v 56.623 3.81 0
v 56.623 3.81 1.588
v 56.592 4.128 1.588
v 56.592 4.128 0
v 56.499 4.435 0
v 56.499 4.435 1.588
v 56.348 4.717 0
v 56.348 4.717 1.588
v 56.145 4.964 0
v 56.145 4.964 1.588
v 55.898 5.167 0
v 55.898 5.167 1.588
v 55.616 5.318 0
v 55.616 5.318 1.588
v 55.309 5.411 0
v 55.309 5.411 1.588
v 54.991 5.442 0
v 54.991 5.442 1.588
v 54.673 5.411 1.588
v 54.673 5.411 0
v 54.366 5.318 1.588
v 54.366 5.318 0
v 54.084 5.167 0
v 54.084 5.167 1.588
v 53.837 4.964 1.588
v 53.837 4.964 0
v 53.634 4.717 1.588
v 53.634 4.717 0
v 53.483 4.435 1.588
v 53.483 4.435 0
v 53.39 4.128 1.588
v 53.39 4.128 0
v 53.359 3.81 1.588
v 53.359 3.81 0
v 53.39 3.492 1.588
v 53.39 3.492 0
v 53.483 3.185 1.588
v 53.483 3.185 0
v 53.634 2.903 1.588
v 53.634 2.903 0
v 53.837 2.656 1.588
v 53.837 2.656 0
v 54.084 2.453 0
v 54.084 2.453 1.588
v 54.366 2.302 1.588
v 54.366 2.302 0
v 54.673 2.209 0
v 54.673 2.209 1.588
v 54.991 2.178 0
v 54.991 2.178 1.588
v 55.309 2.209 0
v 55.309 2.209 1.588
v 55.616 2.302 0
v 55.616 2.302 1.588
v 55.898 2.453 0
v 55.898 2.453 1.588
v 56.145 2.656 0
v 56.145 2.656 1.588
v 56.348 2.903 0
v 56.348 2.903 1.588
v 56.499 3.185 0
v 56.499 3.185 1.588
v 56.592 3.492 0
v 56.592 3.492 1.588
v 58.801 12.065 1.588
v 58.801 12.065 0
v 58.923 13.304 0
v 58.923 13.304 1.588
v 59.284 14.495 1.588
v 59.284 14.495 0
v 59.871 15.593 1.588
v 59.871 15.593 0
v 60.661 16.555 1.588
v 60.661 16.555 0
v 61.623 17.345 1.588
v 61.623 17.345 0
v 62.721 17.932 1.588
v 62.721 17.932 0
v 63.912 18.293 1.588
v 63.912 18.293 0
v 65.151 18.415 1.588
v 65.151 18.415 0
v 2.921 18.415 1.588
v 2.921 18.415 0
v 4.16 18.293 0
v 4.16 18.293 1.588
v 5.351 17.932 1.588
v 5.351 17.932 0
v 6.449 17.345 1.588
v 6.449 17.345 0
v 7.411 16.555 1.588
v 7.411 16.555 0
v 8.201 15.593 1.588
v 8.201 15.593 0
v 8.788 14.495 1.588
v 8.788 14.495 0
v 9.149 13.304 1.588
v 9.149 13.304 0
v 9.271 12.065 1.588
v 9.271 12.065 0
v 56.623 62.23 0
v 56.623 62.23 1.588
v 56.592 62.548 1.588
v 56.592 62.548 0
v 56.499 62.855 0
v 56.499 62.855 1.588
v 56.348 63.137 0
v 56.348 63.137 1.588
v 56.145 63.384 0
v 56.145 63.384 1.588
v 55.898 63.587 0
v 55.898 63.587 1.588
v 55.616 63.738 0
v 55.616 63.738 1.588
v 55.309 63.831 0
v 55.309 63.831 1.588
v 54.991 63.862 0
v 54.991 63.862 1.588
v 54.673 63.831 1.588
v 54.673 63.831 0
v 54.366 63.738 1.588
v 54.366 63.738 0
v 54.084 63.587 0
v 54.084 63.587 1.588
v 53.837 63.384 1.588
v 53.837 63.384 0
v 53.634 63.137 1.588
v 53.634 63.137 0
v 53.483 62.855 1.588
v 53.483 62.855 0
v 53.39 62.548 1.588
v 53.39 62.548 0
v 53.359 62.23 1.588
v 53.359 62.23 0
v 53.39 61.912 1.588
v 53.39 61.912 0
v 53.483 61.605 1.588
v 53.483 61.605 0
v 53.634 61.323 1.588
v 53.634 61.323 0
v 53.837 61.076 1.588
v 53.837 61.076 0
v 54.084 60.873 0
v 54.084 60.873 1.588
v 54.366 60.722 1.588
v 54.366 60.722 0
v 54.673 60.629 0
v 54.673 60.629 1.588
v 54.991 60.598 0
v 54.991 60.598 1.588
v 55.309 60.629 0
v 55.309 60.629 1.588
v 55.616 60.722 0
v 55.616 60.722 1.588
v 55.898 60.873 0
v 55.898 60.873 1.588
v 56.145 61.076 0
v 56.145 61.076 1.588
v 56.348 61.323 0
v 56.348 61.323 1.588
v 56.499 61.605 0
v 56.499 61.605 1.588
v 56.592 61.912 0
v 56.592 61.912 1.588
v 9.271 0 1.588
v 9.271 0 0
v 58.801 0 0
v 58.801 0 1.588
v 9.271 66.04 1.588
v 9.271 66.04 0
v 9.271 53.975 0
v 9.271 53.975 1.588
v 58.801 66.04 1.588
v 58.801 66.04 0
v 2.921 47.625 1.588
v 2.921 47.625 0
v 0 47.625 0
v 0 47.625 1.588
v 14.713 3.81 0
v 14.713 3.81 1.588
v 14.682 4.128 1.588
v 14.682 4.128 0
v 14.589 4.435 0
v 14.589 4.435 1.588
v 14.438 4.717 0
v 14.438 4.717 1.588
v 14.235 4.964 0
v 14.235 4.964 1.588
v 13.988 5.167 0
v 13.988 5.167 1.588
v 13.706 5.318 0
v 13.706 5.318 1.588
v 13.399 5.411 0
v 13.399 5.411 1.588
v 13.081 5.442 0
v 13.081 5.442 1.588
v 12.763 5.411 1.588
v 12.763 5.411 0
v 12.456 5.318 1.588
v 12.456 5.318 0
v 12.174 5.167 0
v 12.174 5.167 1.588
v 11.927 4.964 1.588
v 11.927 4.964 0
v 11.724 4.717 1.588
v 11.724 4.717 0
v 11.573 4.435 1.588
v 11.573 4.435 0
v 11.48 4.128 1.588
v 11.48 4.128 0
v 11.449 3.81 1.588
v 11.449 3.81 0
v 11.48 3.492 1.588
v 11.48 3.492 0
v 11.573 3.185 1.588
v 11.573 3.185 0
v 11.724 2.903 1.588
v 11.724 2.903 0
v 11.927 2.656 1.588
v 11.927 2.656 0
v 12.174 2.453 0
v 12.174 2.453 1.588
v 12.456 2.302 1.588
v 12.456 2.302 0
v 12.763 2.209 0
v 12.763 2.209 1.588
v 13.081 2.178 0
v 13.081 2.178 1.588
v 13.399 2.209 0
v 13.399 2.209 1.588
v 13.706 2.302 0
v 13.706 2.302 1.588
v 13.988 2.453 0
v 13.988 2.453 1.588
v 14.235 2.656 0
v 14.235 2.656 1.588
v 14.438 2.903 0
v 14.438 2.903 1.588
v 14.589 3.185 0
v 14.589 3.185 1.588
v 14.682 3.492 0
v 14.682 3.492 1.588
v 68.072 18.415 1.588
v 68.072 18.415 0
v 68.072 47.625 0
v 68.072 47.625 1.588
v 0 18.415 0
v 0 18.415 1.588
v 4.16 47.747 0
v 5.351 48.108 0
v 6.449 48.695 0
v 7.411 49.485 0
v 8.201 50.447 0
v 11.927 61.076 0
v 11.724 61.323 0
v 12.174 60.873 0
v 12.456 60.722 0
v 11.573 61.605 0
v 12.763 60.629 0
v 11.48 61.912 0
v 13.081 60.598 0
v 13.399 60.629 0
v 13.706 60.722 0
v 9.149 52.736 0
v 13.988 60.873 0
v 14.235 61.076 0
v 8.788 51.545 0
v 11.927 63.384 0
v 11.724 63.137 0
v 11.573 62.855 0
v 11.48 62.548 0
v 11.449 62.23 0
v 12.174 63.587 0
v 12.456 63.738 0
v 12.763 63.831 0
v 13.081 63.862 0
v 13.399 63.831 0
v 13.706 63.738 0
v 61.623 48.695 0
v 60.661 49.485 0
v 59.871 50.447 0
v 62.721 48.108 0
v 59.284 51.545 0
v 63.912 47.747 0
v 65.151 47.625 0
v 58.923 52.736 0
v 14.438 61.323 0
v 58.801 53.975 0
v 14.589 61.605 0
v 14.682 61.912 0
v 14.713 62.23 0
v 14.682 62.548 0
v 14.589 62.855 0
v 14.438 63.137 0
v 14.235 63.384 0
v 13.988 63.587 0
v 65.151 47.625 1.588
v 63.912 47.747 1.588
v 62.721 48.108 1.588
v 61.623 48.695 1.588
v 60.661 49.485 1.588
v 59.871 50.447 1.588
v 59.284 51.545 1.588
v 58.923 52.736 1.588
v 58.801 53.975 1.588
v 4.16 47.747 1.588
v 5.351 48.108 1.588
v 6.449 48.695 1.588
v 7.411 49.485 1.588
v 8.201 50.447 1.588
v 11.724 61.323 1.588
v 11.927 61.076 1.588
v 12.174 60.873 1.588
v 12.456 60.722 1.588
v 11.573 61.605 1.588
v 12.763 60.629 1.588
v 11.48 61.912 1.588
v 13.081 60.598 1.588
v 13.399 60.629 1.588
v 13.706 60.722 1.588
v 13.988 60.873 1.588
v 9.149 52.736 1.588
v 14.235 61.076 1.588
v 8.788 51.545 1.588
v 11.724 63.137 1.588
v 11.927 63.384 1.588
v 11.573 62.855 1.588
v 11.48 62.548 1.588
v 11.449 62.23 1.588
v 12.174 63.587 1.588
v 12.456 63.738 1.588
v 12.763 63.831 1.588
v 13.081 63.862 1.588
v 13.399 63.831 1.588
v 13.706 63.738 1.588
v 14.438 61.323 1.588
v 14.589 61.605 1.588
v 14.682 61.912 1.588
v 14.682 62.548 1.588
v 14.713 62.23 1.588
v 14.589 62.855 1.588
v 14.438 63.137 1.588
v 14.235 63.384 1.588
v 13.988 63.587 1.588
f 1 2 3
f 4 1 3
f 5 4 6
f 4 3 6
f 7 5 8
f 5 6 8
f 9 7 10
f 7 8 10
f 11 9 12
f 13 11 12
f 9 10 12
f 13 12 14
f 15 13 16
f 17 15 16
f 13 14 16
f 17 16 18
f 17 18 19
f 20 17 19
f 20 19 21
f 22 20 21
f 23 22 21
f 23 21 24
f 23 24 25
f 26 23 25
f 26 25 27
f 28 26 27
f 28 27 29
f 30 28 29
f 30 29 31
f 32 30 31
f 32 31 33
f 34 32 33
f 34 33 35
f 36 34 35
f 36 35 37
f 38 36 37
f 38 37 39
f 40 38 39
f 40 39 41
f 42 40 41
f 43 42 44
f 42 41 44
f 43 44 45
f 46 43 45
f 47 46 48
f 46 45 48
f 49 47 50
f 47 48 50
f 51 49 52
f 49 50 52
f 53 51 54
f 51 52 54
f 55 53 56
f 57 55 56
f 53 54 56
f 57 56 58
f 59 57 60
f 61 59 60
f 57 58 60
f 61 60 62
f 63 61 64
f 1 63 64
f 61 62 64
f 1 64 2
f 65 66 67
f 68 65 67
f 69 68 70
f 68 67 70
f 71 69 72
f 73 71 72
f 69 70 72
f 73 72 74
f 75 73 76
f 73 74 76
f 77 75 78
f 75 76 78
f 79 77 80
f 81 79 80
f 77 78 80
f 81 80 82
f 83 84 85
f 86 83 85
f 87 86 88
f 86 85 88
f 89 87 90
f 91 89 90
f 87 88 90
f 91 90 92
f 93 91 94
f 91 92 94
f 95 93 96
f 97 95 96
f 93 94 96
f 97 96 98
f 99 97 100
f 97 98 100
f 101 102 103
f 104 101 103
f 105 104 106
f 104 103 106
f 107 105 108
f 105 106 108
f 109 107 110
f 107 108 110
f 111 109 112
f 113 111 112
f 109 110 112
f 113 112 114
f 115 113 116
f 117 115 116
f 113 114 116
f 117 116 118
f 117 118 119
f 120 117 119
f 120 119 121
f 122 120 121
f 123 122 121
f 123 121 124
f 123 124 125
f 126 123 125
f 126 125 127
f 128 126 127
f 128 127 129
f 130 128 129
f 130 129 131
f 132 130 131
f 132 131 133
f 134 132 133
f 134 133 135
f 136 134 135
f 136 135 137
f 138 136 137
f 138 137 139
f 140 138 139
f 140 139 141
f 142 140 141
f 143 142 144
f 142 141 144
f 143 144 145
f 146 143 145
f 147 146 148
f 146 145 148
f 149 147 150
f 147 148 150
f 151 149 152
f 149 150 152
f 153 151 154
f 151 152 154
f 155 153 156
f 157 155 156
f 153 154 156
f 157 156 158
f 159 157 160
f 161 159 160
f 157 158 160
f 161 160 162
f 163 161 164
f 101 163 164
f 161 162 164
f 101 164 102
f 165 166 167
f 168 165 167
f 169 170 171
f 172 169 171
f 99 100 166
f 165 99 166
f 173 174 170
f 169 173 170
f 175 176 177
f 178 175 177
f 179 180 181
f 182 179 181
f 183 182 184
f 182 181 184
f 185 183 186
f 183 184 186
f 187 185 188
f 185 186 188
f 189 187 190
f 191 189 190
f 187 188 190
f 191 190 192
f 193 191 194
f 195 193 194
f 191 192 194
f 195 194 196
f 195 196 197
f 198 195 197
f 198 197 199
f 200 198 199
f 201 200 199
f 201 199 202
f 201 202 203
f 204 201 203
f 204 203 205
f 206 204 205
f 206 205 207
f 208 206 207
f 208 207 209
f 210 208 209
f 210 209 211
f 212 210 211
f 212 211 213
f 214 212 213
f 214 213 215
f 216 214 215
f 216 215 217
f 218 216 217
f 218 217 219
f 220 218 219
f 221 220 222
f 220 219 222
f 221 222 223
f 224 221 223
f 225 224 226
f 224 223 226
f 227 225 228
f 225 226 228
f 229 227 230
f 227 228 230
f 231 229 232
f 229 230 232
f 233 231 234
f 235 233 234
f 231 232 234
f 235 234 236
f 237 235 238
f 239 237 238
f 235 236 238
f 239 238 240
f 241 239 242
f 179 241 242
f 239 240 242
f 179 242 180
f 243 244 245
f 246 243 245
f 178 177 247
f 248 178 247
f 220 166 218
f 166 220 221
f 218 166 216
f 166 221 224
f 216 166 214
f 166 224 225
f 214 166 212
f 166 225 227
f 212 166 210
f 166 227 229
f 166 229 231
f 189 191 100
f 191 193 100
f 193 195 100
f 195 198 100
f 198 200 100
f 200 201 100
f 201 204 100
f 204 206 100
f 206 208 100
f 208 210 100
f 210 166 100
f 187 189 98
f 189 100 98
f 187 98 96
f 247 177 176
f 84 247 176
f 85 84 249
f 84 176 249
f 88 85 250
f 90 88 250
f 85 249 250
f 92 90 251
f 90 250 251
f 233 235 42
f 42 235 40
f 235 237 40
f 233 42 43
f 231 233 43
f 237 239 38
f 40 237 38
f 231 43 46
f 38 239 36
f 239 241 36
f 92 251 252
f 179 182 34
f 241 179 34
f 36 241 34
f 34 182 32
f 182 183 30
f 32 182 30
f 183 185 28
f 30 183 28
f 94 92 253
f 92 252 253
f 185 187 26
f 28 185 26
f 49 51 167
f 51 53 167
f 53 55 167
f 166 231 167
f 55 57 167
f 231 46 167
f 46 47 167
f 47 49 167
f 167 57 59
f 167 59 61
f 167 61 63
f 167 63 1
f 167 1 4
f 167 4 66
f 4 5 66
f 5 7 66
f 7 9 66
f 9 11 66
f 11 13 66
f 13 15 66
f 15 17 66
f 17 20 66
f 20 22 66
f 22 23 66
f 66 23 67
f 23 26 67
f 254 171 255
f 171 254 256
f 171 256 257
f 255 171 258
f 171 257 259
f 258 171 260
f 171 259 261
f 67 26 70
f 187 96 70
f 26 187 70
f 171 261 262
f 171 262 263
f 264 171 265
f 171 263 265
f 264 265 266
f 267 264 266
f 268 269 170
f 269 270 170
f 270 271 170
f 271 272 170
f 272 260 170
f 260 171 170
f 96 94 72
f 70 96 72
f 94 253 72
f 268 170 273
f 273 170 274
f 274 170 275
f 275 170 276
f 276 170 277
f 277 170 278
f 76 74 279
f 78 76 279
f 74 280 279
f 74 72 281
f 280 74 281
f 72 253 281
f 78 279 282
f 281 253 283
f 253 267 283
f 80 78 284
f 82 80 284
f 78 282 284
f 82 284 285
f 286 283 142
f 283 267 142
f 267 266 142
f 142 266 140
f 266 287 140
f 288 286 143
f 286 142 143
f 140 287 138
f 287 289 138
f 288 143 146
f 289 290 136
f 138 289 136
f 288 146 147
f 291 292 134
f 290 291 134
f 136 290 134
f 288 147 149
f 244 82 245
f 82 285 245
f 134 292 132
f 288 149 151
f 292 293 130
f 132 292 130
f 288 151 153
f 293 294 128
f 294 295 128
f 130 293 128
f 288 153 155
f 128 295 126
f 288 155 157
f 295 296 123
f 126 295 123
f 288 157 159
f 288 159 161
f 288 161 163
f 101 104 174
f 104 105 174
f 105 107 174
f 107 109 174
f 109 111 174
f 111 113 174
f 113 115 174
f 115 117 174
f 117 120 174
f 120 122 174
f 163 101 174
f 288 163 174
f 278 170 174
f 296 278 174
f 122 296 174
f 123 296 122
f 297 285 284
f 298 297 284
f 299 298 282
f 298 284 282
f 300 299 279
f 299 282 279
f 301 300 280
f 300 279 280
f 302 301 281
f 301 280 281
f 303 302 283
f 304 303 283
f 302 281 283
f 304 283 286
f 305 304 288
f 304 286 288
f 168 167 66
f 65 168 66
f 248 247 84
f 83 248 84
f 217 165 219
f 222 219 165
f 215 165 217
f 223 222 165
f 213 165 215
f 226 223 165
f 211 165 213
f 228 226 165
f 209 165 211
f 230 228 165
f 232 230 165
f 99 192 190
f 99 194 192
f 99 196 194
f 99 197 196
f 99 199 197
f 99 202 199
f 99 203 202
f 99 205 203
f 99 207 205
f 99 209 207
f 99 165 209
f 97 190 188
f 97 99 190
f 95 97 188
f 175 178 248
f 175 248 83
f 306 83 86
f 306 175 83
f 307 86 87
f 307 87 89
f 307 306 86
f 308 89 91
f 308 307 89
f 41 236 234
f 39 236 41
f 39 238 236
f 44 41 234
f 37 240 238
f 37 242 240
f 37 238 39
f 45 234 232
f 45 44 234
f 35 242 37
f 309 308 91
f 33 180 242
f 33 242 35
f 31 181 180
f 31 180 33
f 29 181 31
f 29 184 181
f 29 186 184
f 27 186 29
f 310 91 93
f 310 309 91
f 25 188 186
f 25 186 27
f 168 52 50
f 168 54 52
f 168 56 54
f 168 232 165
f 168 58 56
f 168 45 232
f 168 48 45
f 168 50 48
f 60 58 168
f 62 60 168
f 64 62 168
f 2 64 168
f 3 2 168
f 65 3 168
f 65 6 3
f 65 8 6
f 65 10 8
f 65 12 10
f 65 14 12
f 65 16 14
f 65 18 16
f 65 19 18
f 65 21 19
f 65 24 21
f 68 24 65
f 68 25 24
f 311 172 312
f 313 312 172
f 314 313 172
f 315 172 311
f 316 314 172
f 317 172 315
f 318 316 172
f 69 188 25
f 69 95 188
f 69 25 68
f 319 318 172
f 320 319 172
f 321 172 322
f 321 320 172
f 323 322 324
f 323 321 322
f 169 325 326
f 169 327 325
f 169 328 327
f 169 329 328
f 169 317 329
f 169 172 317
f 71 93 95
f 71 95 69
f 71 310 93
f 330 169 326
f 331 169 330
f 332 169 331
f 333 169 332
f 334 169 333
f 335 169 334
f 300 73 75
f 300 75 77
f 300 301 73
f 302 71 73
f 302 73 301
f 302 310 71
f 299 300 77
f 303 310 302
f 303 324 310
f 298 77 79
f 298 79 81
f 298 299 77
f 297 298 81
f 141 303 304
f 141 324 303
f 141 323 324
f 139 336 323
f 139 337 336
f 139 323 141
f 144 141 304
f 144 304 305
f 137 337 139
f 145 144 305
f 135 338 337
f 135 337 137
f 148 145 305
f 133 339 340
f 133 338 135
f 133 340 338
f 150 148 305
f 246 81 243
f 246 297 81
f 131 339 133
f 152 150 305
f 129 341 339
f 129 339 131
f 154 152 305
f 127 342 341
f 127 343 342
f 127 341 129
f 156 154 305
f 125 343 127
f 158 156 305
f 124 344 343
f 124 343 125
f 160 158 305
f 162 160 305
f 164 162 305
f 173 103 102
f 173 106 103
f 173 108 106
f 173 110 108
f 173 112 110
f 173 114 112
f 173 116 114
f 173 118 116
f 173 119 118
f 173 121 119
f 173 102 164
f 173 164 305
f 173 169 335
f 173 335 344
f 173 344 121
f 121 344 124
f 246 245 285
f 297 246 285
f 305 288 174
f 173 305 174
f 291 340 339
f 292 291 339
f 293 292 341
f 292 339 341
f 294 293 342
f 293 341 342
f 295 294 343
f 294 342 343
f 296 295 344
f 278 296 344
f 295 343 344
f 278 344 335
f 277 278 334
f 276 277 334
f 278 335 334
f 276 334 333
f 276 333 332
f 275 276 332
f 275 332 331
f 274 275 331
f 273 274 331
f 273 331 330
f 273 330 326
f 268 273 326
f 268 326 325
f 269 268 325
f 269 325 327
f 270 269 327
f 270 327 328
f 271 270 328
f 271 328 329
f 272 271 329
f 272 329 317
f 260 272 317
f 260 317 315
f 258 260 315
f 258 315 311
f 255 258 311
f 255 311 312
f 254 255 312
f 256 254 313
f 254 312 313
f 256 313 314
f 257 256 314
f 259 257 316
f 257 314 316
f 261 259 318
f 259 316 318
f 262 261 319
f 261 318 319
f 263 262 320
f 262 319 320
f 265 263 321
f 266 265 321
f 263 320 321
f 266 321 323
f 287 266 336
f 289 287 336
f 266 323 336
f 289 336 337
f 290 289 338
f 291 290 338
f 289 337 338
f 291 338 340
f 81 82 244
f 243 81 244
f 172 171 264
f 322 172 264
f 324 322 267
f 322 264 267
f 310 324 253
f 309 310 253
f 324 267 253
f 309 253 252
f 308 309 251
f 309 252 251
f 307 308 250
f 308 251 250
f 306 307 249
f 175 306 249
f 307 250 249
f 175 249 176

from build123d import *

# Parameters (mm, degrees)
BOSS_EXTRUDE1_DEPTH = 1.5875
SKETCH3_R           = 1.63195
CUT_EXTRUDE1_DEPTH  = 95.855674265


with BuildPart() as part:
    # Sketch1 → Boss-Extrude1 (new body)
    with BuildSketch(Plane.XY):
        with BuildLine():
            Line((0, 47.625), (0, 18.415))
            Line((0, 18.415), (2.921, 18.415))
            ThreePointArc((2.921, 18.415), (7.411128061, 16.555128061), (9.271, 12.065))
            Line((9.271, 12.065), (9.271, 0))
            Line((9.271, 0), (58.801, 0))
            Line((58.801, 0), (58.801, 12.065))
            ThreePointArc((58.801, 12.065), (60.660871939, 16.555128061), (65.151, 18.415))
            Line((65.151, 18.415), (68.072, 18.415))
            Line((68.072, 18.415), (68.072, 47.625))
            Line((68.072, 47.625), (65.151, 47.625))
            ThreePointArc((65.151, 47.625), (60.660871939, 49.484871939), (58.801, 53.975))
            Line((58.801, 53.975), (58.801, 66.04))
            Line((58.801, 66.04), (9.271, 66.04))
            Line((9.271, 66.04), (9.271, 53.975))
            ThreePointArc((9.271, 53.975), (7.411128061, 49.484871939), (2.921, 47.625))
            Line((2.921, 47.625), (0, 47.625))
        make_face()
    extrude(amount=BOSS_EXTRUDE1_DEPTH)

    # Sketch3 → Cut-Extrude1 (cut, through all)
    with BuildSketch(Plane.XY.offset(1.5875)):
        with Locations((54.991, 62.23)):
            Circle(SKETCH3_R)
        with Locations((54.991, 3.81)):
            Circle(SKETCH3_R)
        with Locations((13.081, 3.81)):
            Circle(SKETCH3_R)
        with Locations((13.081, 62.23)):
            Circle(SKETCH3_R)
    extrude(amount=-CUT_EXTRUDE1_DEPTH, mode=Mode.SUBTRACT)


solid = part.part
